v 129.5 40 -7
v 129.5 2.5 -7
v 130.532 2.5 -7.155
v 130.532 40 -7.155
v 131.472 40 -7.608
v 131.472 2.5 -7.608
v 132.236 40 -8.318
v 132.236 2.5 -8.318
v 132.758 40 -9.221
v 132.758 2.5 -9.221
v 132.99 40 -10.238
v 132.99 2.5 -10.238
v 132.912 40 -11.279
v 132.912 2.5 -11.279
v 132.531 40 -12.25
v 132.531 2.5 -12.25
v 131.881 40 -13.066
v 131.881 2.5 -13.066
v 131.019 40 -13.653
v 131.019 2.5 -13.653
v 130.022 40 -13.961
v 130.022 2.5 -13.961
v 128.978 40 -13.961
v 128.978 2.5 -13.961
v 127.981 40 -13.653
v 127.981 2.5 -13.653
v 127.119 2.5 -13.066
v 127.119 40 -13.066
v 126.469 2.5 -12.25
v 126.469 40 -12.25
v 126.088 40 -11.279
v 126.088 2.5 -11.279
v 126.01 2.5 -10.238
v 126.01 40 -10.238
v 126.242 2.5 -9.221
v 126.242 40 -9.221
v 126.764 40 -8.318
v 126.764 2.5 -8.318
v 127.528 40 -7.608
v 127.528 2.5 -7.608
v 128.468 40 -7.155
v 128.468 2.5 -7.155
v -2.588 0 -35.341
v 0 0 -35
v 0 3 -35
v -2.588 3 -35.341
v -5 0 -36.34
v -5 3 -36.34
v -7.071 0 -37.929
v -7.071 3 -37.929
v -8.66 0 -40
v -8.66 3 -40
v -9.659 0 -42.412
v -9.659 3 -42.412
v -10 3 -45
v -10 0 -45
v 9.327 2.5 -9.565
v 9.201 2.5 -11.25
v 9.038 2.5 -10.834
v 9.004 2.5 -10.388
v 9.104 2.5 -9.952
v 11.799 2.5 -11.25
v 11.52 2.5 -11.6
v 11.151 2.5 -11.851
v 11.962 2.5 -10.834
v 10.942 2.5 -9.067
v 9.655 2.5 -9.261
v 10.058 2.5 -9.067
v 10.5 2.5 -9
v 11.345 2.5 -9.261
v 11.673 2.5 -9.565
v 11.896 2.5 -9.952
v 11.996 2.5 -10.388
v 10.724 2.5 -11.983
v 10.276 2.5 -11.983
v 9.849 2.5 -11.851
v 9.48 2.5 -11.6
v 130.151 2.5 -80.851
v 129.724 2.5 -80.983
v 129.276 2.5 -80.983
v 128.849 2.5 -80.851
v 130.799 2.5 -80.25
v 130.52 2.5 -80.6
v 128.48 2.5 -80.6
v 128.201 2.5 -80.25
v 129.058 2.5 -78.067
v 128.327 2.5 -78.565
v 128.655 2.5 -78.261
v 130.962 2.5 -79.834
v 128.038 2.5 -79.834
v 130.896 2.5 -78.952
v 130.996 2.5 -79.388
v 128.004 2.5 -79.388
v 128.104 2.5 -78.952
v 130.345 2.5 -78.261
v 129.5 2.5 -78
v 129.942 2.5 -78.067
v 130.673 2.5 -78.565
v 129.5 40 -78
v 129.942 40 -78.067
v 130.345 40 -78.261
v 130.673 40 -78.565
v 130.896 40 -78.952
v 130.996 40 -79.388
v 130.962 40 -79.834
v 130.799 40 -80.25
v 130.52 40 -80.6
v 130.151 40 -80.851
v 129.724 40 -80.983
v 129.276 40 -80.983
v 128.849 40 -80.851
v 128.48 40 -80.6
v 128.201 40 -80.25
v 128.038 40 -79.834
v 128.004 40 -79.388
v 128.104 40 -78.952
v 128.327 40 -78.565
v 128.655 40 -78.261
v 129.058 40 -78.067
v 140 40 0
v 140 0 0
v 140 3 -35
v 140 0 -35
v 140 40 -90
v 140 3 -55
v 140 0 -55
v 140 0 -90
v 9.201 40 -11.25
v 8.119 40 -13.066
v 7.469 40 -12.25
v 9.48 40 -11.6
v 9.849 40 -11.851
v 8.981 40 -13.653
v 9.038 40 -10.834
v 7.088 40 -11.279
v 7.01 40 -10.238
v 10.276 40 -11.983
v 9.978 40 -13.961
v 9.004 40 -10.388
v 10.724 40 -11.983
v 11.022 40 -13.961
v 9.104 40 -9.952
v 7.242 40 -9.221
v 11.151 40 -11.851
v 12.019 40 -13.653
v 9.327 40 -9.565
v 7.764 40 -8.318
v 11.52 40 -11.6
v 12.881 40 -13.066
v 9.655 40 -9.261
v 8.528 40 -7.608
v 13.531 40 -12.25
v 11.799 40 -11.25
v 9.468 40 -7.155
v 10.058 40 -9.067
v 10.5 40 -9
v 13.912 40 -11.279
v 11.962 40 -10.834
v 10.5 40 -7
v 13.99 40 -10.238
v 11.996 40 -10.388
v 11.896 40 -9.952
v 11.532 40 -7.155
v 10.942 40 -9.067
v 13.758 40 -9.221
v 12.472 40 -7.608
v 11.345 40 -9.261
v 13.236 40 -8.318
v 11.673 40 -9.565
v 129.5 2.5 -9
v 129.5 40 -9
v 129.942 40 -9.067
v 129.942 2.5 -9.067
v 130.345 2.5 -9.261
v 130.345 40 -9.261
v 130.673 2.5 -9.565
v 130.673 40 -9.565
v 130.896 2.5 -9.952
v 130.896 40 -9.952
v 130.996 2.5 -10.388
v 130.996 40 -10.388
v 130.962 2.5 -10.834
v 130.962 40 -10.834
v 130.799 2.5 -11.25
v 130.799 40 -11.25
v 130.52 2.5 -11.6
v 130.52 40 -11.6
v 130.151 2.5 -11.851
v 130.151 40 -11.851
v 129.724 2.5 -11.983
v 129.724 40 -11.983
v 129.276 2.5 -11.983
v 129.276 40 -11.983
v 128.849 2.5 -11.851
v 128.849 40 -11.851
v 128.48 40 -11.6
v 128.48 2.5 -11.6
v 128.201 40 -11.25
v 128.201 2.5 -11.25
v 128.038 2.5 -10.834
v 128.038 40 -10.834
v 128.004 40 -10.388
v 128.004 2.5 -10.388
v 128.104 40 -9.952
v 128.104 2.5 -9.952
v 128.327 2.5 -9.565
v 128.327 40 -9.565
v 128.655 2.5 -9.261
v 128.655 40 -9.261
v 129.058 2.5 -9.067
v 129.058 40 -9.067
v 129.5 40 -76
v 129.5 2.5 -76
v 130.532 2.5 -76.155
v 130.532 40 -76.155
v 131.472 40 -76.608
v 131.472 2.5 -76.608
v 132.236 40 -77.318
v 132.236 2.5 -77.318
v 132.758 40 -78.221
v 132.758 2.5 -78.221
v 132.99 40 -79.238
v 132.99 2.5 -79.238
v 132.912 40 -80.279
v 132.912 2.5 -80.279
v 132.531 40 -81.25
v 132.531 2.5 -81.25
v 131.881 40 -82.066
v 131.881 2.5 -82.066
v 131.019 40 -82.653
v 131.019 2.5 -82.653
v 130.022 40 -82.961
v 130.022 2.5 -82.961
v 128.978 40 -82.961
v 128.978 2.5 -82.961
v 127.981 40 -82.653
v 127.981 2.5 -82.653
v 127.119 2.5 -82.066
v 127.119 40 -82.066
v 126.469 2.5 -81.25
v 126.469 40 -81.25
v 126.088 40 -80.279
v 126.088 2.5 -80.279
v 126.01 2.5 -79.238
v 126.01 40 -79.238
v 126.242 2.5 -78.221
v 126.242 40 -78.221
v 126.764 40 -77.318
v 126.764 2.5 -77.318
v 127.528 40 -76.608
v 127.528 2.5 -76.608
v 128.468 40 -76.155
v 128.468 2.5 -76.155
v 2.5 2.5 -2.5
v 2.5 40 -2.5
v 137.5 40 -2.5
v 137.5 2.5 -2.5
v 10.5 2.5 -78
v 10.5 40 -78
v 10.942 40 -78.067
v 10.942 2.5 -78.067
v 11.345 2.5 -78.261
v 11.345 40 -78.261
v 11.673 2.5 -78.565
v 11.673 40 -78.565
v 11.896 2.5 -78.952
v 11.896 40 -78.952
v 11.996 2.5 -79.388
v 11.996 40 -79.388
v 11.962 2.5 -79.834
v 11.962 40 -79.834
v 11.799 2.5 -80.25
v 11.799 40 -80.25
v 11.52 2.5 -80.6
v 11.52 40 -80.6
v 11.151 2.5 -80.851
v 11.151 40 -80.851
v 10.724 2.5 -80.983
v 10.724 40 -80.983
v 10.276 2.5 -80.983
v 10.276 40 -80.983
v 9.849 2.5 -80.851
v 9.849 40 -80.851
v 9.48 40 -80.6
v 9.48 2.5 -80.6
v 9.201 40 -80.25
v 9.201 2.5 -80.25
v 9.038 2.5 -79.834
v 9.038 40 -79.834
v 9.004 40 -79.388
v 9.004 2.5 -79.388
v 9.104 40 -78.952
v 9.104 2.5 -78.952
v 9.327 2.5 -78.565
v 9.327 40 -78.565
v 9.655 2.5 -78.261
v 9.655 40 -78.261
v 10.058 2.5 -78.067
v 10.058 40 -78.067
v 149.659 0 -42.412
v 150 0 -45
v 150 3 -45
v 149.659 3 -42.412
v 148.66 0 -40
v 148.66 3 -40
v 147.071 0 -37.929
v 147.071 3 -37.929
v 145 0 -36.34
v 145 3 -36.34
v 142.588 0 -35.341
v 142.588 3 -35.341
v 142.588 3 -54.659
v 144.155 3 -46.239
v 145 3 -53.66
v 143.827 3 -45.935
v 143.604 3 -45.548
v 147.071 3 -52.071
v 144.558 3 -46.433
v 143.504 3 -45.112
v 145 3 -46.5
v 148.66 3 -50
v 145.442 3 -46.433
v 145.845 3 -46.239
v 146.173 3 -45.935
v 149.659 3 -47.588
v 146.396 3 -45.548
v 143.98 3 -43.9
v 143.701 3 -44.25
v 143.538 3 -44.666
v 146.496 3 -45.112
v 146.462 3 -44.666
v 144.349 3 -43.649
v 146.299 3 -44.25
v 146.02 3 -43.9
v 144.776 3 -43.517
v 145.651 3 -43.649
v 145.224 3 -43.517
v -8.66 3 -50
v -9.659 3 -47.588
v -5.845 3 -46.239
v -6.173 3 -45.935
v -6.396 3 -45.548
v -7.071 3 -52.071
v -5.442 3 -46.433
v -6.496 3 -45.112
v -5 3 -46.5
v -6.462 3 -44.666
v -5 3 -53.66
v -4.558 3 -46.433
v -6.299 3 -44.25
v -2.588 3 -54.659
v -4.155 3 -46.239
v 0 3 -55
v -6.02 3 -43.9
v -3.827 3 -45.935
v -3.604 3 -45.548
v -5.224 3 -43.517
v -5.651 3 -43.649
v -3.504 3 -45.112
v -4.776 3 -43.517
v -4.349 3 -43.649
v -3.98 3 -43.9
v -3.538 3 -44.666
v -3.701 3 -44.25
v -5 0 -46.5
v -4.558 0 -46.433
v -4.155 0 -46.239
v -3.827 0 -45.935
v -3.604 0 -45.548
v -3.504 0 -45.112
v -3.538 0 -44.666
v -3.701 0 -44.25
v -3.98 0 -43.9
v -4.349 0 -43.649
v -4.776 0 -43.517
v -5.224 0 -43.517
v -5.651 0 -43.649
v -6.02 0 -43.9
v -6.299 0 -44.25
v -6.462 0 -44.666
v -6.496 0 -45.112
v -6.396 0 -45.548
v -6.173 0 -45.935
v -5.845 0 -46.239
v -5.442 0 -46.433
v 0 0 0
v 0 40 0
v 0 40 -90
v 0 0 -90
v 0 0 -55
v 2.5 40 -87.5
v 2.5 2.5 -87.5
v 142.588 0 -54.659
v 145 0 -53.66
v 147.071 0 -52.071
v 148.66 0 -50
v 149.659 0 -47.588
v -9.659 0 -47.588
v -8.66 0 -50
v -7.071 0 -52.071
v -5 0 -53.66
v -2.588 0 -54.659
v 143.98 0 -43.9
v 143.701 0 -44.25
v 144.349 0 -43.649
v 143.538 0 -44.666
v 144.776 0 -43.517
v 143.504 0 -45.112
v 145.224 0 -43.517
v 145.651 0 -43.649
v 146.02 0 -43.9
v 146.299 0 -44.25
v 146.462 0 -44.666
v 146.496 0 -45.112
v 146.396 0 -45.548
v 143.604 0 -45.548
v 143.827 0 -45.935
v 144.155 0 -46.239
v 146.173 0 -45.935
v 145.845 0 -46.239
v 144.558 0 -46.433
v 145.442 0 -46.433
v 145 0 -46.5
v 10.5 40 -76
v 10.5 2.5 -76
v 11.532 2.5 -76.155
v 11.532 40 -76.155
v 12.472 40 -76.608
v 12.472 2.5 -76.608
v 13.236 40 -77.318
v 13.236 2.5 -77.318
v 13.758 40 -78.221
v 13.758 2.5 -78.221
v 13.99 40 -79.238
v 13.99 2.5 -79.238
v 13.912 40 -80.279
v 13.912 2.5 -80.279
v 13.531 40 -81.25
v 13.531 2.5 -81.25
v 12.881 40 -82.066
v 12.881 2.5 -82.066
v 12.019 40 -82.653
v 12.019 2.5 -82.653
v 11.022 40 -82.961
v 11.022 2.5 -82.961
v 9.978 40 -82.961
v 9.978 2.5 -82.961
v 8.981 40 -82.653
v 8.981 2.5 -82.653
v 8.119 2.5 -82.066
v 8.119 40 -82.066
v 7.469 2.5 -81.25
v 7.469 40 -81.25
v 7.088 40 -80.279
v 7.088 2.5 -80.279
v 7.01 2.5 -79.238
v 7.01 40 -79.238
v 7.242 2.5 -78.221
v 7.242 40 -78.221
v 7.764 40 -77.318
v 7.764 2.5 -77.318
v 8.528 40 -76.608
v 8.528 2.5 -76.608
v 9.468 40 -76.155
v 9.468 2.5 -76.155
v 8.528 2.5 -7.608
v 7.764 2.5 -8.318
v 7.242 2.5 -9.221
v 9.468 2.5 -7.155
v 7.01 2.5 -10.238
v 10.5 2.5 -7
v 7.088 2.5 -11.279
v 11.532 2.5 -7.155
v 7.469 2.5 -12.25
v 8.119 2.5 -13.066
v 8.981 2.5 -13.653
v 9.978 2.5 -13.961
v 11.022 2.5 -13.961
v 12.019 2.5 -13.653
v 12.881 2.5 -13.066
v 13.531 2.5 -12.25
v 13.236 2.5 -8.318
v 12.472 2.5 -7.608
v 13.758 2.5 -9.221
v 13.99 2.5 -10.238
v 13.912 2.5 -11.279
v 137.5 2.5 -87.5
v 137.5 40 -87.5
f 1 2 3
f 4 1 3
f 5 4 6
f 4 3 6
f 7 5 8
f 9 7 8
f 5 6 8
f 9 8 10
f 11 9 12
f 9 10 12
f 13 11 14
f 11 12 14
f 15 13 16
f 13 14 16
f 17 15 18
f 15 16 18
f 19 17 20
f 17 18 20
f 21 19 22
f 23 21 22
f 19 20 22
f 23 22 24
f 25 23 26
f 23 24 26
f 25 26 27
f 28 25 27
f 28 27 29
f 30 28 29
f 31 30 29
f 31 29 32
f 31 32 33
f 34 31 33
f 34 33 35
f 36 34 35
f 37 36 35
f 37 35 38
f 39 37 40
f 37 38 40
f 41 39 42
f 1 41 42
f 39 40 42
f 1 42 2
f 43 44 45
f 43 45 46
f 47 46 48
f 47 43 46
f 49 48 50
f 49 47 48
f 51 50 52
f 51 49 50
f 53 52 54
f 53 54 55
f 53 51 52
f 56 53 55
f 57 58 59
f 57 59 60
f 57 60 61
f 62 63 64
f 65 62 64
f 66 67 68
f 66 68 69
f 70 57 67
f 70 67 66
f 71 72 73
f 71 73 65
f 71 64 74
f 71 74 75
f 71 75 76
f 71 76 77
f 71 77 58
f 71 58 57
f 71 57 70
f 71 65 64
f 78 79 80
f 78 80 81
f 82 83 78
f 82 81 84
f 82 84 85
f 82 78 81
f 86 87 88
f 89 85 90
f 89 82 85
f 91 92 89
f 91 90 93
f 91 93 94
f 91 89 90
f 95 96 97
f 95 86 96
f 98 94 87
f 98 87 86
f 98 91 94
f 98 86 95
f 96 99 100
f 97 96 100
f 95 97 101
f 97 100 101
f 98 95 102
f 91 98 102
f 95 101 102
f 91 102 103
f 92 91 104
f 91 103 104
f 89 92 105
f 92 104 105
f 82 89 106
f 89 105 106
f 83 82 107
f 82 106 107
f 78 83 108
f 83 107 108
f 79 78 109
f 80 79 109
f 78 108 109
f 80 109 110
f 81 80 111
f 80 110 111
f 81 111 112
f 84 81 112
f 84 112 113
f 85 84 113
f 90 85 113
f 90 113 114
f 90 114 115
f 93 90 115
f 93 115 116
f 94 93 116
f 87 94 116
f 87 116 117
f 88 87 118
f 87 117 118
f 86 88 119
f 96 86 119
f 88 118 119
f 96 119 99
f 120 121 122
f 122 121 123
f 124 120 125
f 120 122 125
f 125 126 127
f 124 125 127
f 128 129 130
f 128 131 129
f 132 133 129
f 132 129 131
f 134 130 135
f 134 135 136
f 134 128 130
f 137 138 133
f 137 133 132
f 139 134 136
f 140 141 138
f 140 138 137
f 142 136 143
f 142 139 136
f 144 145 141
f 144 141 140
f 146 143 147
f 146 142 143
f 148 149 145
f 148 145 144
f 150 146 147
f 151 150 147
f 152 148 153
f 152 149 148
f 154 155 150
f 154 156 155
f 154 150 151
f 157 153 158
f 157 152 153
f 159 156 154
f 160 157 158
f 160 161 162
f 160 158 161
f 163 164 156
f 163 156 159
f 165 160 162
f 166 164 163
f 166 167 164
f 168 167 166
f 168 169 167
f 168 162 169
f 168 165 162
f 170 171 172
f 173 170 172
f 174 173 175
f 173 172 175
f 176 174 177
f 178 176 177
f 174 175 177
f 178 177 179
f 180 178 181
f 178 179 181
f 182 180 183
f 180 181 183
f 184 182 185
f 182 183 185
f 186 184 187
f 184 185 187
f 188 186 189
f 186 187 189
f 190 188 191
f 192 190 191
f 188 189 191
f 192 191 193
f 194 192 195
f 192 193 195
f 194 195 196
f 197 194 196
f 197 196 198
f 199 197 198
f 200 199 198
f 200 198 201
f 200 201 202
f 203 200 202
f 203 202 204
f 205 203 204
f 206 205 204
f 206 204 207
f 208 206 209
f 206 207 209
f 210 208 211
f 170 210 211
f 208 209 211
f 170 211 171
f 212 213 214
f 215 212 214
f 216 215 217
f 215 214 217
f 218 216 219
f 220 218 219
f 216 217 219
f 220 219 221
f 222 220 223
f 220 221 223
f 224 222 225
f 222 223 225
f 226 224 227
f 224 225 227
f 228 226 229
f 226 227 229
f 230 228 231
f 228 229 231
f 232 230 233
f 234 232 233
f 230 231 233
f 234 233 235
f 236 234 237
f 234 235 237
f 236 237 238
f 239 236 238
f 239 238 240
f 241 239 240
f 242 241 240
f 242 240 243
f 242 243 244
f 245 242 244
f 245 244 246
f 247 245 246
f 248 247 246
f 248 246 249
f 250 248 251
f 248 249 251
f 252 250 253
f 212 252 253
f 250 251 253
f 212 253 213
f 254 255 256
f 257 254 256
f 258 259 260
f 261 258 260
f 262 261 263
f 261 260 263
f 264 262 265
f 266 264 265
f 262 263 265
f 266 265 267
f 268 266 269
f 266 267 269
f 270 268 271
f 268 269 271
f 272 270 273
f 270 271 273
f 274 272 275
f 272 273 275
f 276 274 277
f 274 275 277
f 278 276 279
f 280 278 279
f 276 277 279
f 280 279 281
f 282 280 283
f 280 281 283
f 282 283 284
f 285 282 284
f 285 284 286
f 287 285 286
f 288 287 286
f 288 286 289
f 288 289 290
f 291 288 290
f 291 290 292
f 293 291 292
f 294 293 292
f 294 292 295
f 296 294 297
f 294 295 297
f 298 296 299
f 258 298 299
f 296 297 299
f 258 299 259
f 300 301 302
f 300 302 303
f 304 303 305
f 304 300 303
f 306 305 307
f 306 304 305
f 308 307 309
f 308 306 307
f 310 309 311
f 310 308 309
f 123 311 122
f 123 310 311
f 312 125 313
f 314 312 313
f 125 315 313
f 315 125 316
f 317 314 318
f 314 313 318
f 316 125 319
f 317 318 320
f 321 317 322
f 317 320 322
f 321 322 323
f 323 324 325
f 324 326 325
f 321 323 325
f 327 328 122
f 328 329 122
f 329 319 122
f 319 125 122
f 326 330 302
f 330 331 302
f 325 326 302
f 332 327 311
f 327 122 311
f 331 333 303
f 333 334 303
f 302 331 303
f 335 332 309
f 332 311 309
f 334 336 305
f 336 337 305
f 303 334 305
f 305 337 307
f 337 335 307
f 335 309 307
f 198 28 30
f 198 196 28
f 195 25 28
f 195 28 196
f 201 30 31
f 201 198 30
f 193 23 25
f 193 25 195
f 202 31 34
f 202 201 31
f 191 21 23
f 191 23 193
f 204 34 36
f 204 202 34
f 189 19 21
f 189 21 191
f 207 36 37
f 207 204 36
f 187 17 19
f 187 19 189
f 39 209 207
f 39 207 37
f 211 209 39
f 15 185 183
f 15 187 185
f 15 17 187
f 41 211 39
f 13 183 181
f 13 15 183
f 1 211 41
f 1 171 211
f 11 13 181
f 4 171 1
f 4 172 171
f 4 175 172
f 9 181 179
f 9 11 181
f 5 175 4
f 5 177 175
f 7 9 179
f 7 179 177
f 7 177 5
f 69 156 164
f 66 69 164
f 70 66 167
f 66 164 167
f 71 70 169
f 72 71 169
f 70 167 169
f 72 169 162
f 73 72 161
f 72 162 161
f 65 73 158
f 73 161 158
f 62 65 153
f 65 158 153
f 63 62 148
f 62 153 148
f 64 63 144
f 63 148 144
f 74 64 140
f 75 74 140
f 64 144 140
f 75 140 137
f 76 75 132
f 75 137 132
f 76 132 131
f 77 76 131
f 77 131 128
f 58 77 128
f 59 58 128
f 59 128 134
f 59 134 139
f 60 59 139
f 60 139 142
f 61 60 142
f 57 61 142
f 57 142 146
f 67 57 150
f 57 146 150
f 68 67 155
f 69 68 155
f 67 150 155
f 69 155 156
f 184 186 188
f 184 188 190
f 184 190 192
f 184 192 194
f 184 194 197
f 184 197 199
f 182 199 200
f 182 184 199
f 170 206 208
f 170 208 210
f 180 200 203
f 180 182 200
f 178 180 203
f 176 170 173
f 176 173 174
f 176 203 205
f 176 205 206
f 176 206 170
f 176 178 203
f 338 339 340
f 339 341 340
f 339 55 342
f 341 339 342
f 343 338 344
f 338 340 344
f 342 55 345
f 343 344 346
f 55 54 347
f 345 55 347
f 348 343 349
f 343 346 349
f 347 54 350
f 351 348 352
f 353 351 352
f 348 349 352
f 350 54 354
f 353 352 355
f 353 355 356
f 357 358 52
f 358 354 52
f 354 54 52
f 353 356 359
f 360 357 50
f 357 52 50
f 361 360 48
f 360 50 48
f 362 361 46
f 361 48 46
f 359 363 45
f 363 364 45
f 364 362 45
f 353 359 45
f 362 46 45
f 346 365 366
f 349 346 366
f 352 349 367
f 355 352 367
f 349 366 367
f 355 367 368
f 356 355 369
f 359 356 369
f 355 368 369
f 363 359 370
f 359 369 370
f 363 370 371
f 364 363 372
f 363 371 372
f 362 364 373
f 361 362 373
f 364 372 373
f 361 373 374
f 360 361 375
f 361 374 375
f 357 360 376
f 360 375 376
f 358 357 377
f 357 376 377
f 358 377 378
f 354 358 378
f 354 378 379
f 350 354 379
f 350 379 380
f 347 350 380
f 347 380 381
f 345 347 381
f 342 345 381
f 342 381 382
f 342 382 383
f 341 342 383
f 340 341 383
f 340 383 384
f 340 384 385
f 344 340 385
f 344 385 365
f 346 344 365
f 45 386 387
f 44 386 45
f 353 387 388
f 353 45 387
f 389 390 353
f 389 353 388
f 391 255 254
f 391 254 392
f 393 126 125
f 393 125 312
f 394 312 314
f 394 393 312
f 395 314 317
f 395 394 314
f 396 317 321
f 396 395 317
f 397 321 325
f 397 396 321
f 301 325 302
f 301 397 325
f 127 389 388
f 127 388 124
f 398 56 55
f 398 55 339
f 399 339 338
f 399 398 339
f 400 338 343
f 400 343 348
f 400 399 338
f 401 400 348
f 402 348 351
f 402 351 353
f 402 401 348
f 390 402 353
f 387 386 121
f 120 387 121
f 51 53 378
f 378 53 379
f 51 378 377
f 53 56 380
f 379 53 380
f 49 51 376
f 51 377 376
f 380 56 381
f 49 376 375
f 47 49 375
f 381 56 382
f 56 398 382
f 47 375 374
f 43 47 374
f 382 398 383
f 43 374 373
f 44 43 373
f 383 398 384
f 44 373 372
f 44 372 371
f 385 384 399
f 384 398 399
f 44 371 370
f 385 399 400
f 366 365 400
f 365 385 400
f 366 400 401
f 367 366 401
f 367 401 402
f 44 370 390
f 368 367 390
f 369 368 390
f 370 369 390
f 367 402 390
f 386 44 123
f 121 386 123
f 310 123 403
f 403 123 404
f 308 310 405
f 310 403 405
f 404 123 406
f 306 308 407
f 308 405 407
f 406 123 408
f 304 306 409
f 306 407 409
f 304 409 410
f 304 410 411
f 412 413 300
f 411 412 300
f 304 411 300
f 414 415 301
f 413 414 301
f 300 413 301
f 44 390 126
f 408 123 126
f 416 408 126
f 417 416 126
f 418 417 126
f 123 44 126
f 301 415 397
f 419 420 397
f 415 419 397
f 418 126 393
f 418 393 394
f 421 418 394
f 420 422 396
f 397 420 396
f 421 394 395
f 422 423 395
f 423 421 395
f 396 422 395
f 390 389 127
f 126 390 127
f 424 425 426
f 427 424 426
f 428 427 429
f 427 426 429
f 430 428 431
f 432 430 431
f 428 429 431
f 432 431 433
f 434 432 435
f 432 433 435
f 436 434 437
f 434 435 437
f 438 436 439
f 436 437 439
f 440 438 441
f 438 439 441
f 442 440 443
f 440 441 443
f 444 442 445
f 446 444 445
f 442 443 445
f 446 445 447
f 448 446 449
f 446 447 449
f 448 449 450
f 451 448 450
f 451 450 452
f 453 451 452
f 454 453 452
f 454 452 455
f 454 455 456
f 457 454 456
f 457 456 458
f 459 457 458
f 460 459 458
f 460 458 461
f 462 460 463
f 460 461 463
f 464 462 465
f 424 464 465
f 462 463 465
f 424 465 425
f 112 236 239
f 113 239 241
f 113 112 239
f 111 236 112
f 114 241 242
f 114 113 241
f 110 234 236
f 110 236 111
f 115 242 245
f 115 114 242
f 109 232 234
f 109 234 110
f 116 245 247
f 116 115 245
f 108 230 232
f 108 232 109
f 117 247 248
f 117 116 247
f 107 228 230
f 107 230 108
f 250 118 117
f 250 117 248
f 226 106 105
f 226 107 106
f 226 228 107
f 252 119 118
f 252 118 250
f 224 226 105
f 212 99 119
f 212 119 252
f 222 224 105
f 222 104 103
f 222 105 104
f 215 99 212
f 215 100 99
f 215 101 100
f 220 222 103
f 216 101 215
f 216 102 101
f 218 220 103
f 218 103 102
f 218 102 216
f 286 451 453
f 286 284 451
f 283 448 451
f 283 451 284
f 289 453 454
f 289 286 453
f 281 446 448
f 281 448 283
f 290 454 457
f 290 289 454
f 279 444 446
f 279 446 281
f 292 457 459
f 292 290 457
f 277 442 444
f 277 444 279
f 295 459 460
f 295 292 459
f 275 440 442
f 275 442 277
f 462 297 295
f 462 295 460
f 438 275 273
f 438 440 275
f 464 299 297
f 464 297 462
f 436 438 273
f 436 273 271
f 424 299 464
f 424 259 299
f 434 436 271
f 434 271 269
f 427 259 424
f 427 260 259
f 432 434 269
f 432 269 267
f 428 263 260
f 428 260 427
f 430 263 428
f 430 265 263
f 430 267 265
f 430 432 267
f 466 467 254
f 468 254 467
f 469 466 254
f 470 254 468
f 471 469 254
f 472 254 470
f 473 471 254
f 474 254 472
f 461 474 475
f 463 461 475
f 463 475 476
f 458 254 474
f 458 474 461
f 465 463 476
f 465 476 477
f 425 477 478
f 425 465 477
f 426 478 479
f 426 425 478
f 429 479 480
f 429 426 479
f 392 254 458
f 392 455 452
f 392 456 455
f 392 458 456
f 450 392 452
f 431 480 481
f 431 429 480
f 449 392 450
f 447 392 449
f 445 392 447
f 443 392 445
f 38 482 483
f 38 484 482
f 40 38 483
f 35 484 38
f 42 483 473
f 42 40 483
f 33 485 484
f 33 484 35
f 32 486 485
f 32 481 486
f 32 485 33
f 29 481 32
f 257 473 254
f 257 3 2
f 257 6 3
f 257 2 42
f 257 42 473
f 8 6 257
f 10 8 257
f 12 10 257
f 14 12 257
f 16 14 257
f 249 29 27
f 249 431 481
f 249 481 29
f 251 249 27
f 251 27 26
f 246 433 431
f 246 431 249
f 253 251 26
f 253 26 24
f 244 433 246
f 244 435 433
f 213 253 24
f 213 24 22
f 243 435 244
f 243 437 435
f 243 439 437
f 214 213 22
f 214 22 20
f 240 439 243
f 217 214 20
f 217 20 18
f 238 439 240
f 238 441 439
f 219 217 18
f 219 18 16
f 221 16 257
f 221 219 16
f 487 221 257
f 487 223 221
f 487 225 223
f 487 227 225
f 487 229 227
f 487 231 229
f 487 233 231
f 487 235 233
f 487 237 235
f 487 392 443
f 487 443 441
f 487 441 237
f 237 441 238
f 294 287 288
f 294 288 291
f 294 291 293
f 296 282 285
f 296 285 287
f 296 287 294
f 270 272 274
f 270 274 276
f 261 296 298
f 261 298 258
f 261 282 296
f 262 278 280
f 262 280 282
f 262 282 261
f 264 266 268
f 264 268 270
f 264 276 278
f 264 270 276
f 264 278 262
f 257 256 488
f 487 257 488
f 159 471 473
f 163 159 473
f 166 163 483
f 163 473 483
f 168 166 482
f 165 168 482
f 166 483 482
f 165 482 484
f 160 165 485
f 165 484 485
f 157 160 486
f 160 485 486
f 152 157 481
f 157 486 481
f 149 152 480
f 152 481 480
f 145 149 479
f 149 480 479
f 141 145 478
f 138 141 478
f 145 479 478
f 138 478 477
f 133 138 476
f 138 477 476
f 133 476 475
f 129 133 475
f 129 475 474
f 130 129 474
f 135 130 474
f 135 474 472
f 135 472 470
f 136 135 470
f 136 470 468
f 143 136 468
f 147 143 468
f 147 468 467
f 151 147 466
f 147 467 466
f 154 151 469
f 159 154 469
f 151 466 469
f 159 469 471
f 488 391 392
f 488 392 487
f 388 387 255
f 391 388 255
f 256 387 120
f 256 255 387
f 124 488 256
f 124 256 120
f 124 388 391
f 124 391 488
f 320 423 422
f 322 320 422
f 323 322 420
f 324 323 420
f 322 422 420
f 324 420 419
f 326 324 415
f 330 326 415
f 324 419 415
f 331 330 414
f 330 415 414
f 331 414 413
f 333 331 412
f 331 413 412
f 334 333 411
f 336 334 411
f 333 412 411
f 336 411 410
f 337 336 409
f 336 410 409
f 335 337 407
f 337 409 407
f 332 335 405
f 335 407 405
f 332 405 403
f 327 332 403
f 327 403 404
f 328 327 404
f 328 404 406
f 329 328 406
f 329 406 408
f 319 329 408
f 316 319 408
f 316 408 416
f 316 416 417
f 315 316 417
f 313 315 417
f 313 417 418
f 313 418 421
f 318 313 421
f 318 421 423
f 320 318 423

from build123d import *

# Parameters (mm, degrees)
SKETCH1_W           = 140
SKETCH1_H           = 90
BOSS_EXTRUDE1_DEPTH = 40
SKETCH2_W           = 135
SKETCH2_H           = 85
CUT_EXTRUDE1_DEPTH  = 37.5
SKETCH3_R           = 3.5
BOSS_EXTRUDE2_DEPTH = 37.5
SKETCH4_R           = 1.5
CUT_EXTRUDE2_DEPTH  = 37.5
BOSS_EXTRUDE3_DEPTH = 3
SKETCH7_R           = 1.5
CUT_EXTRUDE3_DEPTH  = 180.443584449


with BuildPart() as part:
    # Sketch1 → Boss-Extrude1 (new body)
    with BuildSketch(Plane(origin=(0, 0, 0), x_dir=(1, 0, 0), z_dir=(0, 1, 0))):
        with Locations((70, 45)):
            Rectangle(SKETCH1_W, SKETCH1_H)
    extrude(amount=BOSS_EXTRUDE1_DEPTH)

    # Sketch2 → Cut-Extrude1 (cut)
    with BuildSketch(Plane(origin=(0, 40, 0), x_dir=(1, 0, 0), z_dir=(0, 1, 0))):
        with Locations((70, 45)):
            Rectangle(SKETCH2_W, SKETCH2_H)
    extrude(amount=-CUT_EXTRUDE1_DEPTH, mode=Mode.SUBTRACT)

    # Sketch3 → Boss-Extrude2 (add)
    with BuildSketch(Plane(origin=(0, 2.5, 0), x_dir=(1, 0, 0), z_dir=(0, 1, 0))):
        with Locations(Location((10.5, 79.5, 0), (0, 0, 270))):
            Circle(SKETCH3_R)
        with Locations(Location((10.5, 10.5, 0), (0, 0, 270))):
            Circle(SKETCH3_R)
        with Locations(Location((129.5, 10.5, 0), (0, 0, 270))):
            Circle(SKETCH3_R)
        with Locations(Location((129.5, 79.5, 0), (0, 0, 270))):
            Circle(SKETCH3_R)
    extrude(amount=BOSS_EXTRUDE2_DEPTH)

    # Sketch4 → Cut-Extrude2 (cut)
    with BuildSketch(Plane(origin=(0, 40, 0), x_dir=(1, 0, 0), z_dir=(0, 1, 0))):
        with Locations(Location((10.5, 79.5, 0), (0, 0, 270))):
            Circle(SKETCH4_R)
        with Locations(Location((129.5, 79.5, 0), (0, 0, 270))):
            Circle(SKETCH4_R)
        with Locations(Location((10.5, 10.5, 0), (0, 0, 270))):
            Circle(SKETCH4_R)
        with Locations(Location((129.5, 10.5, 0), (0, 0, 270))):
            Circle(SKETCH4_R)
    extrude(amount=-CUT_EXTRUDE2_DEPTH, mode=Mode.SUBTRACT)

    # Sketch5 → Boss-Extrude3 (add)
    with BuildSketch(Plane.XZ):
        with BuildLine():
            ThreePointArc((0, -35), (-7.071067812, -37.928932188), (-10, -45))
            Line((-10, -45), (0, -45))
            Line((0, -45), (0, -35))
        make_face()
        with BuildLine():
            Line((0, -45), (-10, -45))
            ThreePointArc((-10, -45), (-7.071067812, -52.071067812), (0, -55))
            Line((0, -55), (0, -45))
        make_face()
        with BuildLine():
            Line((140, -35), (140, -45))
            Line((140, -45), (150, -45))
            ThreePointArc((150, -45), (147.071067812, -37.928932188), (140, -35))
        make_face()
        with BuildLine():
            Line((150, -45), (140, -45))
            Line((140, -45), (140, -55))
            ThreePointArc((140, -55), (147.071067812, -52.071067812), (150, -45))
        make_face()
    extrude(amount=-BOSS_EXTRUDE3_DEPTH)

    # Sketch7 → Cut-Extrude3 (cut, through all)
    with BuildSketch(Plane.XZ):
        with Locations(Location((-5, -45, 0), (0, 0, 270))):
            Circle(SKETCH7_R)
        with Locations(Location((145, -45, 0), (0, 0, 270))):
            Circle(SKETCH7_R)
    extrude(amount=-CUT_EXTRUDE3_DEPTH, mode=Mode.SUBTRACT)


solid = part.part
